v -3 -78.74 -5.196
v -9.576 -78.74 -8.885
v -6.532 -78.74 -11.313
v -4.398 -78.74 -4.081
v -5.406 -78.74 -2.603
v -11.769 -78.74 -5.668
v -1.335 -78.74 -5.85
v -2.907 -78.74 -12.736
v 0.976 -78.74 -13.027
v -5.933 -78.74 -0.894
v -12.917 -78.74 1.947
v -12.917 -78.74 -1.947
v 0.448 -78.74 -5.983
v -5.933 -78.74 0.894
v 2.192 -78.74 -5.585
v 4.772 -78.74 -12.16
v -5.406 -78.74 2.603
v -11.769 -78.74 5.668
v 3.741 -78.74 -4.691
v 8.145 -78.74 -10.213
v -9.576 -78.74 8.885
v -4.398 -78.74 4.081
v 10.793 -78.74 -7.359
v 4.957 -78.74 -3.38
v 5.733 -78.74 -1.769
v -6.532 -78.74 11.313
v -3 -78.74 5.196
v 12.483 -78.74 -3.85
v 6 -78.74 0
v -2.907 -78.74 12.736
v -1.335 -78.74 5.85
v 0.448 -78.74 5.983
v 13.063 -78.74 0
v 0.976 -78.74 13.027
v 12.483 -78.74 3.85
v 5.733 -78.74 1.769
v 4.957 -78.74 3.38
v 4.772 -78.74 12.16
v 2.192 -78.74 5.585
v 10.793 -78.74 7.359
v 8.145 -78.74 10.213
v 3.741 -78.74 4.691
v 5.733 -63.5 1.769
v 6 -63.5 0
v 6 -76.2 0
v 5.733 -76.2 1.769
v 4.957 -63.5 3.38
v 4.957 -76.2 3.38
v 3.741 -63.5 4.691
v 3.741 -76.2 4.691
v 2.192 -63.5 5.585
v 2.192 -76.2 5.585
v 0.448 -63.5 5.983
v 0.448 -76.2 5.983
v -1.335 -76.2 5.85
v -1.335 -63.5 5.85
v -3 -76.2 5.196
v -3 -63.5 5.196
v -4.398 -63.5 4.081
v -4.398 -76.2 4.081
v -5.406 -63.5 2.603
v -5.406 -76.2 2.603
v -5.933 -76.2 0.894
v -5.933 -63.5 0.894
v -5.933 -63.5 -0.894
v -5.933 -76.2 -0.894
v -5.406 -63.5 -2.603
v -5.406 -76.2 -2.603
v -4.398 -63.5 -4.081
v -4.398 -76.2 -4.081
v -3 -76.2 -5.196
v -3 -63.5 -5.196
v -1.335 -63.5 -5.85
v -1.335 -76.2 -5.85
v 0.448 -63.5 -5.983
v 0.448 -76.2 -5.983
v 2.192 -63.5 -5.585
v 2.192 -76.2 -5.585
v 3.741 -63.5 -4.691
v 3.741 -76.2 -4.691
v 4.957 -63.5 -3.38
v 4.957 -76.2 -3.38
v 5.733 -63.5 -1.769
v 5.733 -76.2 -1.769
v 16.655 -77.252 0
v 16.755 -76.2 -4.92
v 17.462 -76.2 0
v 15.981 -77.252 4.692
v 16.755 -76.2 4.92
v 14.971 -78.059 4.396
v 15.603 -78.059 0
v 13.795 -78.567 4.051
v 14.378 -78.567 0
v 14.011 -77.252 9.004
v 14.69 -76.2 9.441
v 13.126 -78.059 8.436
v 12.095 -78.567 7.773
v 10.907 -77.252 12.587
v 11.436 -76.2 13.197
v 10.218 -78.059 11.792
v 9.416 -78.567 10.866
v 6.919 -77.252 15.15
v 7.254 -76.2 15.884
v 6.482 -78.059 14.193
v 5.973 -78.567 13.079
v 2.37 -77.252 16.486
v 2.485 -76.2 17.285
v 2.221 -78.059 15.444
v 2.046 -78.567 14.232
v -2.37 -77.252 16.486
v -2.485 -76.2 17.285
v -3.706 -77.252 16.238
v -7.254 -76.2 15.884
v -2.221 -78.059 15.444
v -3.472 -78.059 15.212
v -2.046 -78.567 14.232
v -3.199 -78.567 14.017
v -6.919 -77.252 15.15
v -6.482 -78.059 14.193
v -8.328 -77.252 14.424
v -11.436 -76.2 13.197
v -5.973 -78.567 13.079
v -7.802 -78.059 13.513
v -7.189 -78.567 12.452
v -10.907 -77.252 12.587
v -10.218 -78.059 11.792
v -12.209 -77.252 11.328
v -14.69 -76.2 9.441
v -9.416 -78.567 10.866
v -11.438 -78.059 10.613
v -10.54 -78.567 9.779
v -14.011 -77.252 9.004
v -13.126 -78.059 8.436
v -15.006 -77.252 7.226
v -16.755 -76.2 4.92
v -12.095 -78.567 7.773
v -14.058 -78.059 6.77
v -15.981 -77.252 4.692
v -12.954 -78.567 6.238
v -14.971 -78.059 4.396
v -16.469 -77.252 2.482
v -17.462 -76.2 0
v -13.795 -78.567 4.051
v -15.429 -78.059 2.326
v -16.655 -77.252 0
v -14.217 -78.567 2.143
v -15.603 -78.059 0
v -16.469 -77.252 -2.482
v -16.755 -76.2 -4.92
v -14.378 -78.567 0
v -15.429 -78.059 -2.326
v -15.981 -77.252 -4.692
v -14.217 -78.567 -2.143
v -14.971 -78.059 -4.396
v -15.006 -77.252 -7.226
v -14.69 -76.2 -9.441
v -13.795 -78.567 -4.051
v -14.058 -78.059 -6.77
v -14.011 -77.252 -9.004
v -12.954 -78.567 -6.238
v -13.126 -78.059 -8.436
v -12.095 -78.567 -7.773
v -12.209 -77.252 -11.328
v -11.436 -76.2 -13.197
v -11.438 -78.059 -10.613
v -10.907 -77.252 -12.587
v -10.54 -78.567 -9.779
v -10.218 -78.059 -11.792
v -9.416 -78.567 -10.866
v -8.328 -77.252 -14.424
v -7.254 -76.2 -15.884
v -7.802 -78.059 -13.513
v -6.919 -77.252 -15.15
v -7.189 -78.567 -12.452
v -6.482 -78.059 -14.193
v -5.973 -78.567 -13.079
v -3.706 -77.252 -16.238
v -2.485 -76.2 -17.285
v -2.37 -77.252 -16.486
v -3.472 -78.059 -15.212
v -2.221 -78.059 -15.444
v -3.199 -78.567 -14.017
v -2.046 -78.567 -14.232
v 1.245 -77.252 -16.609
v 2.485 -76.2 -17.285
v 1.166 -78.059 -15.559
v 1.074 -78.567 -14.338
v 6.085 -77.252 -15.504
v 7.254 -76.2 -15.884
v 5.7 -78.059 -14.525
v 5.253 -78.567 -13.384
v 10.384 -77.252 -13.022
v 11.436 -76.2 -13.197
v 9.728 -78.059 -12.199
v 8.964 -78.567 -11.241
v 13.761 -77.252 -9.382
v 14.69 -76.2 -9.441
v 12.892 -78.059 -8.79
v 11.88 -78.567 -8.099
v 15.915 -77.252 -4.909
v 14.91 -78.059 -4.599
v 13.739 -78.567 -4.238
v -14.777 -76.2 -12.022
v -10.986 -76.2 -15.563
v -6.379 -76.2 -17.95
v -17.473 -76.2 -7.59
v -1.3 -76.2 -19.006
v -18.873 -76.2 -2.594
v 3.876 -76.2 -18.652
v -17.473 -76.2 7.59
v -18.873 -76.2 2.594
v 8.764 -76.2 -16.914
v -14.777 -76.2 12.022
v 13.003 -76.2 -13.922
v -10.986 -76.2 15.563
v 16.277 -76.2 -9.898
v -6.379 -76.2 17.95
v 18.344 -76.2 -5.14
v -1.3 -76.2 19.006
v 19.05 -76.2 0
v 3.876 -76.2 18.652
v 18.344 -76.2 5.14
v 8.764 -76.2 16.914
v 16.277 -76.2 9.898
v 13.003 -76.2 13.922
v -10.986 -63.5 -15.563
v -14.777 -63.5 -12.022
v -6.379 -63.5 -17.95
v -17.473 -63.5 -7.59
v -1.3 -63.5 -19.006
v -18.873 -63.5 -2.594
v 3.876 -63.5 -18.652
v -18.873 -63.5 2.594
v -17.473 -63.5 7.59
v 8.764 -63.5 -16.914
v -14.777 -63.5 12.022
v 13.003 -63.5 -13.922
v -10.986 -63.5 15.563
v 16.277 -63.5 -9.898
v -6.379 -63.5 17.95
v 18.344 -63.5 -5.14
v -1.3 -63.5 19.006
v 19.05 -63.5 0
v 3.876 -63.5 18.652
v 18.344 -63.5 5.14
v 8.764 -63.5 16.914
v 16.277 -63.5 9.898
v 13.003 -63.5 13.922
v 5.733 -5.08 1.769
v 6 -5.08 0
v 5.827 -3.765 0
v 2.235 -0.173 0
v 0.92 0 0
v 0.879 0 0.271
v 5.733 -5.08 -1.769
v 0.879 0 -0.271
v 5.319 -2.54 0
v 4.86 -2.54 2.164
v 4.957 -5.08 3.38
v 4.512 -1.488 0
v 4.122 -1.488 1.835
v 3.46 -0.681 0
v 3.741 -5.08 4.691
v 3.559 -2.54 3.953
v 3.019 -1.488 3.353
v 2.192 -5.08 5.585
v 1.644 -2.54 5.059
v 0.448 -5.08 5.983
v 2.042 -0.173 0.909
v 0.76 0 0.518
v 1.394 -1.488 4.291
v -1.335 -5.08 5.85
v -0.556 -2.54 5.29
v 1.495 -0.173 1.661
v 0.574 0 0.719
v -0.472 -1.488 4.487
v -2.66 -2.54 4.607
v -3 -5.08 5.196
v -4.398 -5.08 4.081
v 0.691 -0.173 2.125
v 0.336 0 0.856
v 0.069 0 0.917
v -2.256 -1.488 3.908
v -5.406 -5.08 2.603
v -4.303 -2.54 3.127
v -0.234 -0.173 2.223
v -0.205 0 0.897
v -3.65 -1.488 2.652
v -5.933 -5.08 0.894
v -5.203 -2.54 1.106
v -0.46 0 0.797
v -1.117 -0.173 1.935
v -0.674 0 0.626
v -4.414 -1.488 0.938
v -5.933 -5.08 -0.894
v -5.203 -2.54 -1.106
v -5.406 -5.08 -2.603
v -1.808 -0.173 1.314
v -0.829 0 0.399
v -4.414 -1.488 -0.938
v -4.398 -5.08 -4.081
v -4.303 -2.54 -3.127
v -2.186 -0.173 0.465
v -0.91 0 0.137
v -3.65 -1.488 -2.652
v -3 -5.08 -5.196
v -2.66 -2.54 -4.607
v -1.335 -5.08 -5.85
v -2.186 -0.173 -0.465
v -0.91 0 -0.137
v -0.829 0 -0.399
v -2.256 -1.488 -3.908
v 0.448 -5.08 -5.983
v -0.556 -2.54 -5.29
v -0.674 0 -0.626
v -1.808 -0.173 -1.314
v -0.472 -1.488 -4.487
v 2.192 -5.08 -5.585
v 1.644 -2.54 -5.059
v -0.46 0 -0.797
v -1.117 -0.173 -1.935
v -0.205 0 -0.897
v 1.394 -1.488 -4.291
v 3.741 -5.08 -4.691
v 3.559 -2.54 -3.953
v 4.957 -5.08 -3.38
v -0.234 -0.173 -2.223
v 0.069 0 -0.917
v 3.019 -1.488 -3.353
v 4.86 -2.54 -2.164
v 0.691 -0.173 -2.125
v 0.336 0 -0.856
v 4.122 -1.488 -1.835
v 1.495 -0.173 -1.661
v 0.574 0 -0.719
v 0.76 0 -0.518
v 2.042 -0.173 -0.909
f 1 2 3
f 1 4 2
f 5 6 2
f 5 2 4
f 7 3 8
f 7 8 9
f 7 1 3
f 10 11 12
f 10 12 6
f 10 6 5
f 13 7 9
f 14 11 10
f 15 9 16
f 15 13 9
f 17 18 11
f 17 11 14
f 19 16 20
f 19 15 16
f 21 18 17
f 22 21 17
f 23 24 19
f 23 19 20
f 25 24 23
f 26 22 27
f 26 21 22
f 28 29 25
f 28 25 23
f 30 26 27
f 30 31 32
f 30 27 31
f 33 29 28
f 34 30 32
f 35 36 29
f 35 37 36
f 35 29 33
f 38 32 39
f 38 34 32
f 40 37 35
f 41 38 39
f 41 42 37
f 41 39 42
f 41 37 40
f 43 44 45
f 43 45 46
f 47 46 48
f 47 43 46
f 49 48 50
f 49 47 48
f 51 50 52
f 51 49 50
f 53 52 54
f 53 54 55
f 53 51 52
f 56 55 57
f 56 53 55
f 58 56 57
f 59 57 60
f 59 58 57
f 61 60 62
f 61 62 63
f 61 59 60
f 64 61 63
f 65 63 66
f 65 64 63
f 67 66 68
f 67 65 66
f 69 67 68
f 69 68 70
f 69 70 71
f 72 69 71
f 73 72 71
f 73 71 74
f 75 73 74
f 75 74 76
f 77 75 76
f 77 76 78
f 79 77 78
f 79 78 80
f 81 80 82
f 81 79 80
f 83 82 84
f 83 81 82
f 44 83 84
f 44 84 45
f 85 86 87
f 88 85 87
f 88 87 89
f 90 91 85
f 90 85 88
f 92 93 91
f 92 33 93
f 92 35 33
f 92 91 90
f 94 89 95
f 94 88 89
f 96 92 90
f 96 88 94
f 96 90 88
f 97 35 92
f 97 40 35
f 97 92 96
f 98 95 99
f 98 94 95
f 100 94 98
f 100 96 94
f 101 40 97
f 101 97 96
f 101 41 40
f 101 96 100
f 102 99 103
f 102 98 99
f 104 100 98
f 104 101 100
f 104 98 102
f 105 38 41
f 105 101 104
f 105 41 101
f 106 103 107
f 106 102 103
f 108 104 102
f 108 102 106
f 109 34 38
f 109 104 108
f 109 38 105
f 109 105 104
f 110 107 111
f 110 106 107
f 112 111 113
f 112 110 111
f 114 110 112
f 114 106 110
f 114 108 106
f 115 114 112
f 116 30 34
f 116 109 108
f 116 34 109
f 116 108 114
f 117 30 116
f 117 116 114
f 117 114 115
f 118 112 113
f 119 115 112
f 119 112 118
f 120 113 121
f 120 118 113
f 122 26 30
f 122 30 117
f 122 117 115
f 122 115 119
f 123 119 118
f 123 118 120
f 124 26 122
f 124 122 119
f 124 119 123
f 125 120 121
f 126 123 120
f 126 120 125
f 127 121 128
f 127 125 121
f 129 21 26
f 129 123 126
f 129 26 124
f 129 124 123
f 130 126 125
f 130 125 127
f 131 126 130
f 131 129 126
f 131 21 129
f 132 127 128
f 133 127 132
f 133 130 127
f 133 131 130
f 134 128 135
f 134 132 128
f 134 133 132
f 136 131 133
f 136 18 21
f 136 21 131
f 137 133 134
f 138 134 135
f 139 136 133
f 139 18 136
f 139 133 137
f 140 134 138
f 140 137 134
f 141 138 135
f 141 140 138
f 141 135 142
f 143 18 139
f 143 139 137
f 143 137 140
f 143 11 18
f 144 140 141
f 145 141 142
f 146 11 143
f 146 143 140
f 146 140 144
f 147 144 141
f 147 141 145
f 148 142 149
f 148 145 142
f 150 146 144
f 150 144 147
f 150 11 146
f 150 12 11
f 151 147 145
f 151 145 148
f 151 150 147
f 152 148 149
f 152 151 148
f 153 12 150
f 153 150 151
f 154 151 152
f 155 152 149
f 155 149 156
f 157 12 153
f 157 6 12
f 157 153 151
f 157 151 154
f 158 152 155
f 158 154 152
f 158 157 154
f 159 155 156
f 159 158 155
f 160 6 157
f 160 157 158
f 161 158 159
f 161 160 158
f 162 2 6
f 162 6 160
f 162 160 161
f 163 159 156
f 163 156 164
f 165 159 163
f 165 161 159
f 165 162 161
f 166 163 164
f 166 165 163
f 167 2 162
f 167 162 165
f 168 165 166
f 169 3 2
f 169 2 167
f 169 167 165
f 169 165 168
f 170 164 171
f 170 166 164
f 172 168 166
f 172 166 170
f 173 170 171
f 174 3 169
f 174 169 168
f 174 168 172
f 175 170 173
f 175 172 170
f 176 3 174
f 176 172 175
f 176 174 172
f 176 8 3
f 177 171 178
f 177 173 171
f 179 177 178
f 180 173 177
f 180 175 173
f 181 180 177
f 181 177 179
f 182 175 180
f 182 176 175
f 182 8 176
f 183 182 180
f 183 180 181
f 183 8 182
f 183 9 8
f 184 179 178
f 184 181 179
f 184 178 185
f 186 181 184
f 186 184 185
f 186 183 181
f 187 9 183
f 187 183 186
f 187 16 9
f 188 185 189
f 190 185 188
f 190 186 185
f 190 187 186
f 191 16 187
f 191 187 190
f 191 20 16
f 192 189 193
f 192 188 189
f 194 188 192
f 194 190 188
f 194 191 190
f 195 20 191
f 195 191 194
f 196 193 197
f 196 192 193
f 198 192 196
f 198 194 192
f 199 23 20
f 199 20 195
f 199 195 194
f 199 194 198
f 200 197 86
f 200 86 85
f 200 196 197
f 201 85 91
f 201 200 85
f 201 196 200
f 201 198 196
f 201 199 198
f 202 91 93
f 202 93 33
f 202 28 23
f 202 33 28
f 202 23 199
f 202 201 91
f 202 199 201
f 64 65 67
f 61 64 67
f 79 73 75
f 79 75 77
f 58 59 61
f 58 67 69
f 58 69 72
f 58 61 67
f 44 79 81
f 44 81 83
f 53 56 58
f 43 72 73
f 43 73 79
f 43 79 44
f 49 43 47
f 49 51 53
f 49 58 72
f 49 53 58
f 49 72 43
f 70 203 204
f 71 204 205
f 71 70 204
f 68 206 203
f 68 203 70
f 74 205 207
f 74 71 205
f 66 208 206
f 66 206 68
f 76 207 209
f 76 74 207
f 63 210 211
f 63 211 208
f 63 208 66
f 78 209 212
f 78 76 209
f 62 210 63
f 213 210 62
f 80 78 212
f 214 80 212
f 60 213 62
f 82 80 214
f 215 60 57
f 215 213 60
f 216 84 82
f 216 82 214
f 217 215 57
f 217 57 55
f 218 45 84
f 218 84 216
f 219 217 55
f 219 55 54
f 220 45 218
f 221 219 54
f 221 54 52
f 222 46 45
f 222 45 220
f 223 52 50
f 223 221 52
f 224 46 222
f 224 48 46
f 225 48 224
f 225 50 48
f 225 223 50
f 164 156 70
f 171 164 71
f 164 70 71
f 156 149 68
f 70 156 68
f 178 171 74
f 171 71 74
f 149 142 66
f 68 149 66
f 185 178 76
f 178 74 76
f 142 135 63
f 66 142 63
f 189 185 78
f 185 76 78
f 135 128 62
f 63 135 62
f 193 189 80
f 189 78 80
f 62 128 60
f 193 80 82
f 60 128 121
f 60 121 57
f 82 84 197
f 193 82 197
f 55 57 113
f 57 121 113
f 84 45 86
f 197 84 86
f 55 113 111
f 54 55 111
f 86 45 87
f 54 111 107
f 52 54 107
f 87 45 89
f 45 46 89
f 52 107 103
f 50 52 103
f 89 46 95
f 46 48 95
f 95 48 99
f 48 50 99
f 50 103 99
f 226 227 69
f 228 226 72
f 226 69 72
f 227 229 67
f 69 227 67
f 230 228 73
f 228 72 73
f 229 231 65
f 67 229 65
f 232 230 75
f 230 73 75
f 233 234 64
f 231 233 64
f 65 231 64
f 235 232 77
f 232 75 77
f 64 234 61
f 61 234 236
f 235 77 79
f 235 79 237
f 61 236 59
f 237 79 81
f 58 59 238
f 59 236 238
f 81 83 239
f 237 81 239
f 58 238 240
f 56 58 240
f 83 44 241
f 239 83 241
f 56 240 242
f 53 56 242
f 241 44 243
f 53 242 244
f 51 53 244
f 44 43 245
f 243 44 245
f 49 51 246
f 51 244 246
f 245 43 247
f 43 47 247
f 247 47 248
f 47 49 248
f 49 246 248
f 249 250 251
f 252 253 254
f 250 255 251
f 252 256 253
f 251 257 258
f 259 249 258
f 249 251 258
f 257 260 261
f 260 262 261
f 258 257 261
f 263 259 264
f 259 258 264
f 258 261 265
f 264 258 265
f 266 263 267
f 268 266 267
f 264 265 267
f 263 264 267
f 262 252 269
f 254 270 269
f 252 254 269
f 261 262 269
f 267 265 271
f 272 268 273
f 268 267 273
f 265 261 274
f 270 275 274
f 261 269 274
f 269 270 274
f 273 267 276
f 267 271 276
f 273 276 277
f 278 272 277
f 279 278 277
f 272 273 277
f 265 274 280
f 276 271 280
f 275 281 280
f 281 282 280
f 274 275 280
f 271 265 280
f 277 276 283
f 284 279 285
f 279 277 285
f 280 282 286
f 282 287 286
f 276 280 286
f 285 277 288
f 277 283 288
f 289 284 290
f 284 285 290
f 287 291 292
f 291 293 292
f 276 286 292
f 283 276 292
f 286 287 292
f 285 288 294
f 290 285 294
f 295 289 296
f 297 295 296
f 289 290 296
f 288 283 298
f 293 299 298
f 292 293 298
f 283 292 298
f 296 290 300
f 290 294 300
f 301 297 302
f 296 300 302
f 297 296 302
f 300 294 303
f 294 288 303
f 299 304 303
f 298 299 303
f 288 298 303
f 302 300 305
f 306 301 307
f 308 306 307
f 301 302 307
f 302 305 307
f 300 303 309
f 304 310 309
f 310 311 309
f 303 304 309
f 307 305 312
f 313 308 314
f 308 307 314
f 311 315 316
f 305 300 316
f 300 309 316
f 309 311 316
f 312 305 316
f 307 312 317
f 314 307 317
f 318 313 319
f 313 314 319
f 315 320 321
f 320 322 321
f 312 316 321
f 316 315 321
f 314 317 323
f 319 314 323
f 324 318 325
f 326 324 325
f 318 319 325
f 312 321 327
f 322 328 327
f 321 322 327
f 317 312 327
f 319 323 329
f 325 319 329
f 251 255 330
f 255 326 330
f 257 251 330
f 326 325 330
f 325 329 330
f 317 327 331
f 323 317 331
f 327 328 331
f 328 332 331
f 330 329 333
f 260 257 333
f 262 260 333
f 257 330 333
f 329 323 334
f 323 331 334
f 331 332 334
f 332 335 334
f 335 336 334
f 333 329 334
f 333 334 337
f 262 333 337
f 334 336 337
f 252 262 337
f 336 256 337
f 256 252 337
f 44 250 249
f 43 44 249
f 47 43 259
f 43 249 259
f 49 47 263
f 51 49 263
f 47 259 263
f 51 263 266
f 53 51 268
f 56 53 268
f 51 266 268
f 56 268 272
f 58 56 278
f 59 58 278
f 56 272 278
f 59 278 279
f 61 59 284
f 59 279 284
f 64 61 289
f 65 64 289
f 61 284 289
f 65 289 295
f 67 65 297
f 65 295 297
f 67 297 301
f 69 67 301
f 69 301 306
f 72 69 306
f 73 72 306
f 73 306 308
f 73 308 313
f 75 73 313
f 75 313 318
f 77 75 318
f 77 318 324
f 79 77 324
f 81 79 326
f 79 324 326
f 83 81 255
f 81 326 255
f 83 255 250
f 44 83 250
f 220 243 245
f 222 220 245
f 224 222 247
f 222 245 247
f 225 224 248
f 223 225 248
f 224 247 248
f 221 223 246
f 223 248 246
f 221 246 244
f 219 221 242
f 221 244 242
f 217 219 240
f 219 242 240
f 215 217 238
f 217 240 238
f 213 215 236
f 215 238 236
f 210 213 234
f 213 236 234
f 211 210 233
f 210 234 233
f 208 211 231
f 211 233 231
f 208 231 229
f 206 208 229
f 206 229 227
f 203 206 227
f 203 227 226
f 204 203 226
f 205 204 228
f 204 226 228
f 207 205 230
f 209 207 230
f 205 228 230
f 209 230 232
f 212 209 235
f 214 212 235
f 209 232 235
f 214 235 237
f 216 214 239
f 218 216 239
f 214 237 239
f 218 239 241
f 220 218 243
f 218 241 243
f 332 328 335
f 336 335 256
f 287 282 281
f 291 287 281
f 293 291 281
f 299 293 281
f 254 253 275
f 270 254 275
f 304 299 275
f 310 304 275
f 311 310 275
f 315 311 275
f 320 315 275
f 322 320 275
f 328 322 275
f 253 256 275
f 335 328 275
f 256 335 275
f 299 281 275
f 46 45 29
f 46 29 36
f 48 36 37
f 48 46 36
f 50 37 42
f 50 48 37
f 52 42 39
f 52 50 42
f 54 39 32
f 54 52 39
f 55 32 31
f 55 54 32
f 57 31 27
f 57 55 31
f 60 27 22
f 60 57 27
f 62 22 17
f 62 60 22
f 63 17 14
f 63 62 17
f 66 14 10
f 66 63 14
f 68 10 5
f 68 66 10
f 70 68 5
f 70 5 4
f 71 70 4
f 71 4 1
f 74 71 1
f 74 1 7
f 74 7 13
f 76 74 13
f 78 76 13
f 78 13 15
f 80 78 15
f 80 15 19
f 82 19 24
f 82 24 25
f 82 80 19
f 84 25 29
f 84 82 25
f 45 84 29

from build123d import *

# Parameters (mm, degrees)
F0_R     = 6
F1_DEPTH = 63.5
F2_R     = 19.05
F2_R_2   = 6
F3_DEPTH = 12.7
F4_R     = 17.4625
F4_R_2   = 6
F5_DEPTH = 2.54
F6_R     = 5.08


# Not quite as in the source:
# - a fillet or chamfer that OpenCascade refuses, or shapes differently, is made with other operations: its cross-section is extruded or revolved along the edge and cut away or added


with BuildPart() as f1:
    # F0 (on Front) → F1 (new body)
    with BuildSketch(Plane.XZ):
        Circle(F0_R)
    extrude(amount=F1_DEPTH)

    # F6
    f6_edges = [f1.edges().sort_by_distance(p)[0] for p in [
        (-6, 0, 0),
    ]]
    fillet(f6_edges, radius=F6_R)


with BuildPart() as f3:
    # F2 (on face) → F3 (new body)
    with BuildSketch(Plane.XZ.offset(63.5)):
        Circle(F2_R)
        Circle(F2_R_2, mode=Mode.SUBTRACT)
    extrude(amount=F3_DEPTH)


with BuildPart() as f5:
    # F4 (on face) → F5 (new body)
    with BuildSketch(Plane.XZ.offset(76.2)):
        Circle(F4_R)
        Circle(F4_R_2, mode=Mode.SUBTRACT)
    extrude(amount=F5_DEPTH)

    # F7: fillet of radius 5.08 on 1 edges, made by hand

    # F7_s1 → F7_t2 (revolve, cut)
    with BuildSketch(Plane.XY):
        with BuildLine():
            ThreePointArc((17.4625, -76.2), (15.6030909488, -78.0594090512), (13.0630909488, -78.74))
            Line((13.0630909488, -78.74), (17.4625, -78.74))
            Line((17.4625, -78.74), (17.4625, -76.2))
        make_face()
    revolve(axis=Axis((0, -78.74, 0), (0, -1, 0)), mode=Mode.SUBTRACT)


solid = Compound([f1.part, f3.part, f5.part])
